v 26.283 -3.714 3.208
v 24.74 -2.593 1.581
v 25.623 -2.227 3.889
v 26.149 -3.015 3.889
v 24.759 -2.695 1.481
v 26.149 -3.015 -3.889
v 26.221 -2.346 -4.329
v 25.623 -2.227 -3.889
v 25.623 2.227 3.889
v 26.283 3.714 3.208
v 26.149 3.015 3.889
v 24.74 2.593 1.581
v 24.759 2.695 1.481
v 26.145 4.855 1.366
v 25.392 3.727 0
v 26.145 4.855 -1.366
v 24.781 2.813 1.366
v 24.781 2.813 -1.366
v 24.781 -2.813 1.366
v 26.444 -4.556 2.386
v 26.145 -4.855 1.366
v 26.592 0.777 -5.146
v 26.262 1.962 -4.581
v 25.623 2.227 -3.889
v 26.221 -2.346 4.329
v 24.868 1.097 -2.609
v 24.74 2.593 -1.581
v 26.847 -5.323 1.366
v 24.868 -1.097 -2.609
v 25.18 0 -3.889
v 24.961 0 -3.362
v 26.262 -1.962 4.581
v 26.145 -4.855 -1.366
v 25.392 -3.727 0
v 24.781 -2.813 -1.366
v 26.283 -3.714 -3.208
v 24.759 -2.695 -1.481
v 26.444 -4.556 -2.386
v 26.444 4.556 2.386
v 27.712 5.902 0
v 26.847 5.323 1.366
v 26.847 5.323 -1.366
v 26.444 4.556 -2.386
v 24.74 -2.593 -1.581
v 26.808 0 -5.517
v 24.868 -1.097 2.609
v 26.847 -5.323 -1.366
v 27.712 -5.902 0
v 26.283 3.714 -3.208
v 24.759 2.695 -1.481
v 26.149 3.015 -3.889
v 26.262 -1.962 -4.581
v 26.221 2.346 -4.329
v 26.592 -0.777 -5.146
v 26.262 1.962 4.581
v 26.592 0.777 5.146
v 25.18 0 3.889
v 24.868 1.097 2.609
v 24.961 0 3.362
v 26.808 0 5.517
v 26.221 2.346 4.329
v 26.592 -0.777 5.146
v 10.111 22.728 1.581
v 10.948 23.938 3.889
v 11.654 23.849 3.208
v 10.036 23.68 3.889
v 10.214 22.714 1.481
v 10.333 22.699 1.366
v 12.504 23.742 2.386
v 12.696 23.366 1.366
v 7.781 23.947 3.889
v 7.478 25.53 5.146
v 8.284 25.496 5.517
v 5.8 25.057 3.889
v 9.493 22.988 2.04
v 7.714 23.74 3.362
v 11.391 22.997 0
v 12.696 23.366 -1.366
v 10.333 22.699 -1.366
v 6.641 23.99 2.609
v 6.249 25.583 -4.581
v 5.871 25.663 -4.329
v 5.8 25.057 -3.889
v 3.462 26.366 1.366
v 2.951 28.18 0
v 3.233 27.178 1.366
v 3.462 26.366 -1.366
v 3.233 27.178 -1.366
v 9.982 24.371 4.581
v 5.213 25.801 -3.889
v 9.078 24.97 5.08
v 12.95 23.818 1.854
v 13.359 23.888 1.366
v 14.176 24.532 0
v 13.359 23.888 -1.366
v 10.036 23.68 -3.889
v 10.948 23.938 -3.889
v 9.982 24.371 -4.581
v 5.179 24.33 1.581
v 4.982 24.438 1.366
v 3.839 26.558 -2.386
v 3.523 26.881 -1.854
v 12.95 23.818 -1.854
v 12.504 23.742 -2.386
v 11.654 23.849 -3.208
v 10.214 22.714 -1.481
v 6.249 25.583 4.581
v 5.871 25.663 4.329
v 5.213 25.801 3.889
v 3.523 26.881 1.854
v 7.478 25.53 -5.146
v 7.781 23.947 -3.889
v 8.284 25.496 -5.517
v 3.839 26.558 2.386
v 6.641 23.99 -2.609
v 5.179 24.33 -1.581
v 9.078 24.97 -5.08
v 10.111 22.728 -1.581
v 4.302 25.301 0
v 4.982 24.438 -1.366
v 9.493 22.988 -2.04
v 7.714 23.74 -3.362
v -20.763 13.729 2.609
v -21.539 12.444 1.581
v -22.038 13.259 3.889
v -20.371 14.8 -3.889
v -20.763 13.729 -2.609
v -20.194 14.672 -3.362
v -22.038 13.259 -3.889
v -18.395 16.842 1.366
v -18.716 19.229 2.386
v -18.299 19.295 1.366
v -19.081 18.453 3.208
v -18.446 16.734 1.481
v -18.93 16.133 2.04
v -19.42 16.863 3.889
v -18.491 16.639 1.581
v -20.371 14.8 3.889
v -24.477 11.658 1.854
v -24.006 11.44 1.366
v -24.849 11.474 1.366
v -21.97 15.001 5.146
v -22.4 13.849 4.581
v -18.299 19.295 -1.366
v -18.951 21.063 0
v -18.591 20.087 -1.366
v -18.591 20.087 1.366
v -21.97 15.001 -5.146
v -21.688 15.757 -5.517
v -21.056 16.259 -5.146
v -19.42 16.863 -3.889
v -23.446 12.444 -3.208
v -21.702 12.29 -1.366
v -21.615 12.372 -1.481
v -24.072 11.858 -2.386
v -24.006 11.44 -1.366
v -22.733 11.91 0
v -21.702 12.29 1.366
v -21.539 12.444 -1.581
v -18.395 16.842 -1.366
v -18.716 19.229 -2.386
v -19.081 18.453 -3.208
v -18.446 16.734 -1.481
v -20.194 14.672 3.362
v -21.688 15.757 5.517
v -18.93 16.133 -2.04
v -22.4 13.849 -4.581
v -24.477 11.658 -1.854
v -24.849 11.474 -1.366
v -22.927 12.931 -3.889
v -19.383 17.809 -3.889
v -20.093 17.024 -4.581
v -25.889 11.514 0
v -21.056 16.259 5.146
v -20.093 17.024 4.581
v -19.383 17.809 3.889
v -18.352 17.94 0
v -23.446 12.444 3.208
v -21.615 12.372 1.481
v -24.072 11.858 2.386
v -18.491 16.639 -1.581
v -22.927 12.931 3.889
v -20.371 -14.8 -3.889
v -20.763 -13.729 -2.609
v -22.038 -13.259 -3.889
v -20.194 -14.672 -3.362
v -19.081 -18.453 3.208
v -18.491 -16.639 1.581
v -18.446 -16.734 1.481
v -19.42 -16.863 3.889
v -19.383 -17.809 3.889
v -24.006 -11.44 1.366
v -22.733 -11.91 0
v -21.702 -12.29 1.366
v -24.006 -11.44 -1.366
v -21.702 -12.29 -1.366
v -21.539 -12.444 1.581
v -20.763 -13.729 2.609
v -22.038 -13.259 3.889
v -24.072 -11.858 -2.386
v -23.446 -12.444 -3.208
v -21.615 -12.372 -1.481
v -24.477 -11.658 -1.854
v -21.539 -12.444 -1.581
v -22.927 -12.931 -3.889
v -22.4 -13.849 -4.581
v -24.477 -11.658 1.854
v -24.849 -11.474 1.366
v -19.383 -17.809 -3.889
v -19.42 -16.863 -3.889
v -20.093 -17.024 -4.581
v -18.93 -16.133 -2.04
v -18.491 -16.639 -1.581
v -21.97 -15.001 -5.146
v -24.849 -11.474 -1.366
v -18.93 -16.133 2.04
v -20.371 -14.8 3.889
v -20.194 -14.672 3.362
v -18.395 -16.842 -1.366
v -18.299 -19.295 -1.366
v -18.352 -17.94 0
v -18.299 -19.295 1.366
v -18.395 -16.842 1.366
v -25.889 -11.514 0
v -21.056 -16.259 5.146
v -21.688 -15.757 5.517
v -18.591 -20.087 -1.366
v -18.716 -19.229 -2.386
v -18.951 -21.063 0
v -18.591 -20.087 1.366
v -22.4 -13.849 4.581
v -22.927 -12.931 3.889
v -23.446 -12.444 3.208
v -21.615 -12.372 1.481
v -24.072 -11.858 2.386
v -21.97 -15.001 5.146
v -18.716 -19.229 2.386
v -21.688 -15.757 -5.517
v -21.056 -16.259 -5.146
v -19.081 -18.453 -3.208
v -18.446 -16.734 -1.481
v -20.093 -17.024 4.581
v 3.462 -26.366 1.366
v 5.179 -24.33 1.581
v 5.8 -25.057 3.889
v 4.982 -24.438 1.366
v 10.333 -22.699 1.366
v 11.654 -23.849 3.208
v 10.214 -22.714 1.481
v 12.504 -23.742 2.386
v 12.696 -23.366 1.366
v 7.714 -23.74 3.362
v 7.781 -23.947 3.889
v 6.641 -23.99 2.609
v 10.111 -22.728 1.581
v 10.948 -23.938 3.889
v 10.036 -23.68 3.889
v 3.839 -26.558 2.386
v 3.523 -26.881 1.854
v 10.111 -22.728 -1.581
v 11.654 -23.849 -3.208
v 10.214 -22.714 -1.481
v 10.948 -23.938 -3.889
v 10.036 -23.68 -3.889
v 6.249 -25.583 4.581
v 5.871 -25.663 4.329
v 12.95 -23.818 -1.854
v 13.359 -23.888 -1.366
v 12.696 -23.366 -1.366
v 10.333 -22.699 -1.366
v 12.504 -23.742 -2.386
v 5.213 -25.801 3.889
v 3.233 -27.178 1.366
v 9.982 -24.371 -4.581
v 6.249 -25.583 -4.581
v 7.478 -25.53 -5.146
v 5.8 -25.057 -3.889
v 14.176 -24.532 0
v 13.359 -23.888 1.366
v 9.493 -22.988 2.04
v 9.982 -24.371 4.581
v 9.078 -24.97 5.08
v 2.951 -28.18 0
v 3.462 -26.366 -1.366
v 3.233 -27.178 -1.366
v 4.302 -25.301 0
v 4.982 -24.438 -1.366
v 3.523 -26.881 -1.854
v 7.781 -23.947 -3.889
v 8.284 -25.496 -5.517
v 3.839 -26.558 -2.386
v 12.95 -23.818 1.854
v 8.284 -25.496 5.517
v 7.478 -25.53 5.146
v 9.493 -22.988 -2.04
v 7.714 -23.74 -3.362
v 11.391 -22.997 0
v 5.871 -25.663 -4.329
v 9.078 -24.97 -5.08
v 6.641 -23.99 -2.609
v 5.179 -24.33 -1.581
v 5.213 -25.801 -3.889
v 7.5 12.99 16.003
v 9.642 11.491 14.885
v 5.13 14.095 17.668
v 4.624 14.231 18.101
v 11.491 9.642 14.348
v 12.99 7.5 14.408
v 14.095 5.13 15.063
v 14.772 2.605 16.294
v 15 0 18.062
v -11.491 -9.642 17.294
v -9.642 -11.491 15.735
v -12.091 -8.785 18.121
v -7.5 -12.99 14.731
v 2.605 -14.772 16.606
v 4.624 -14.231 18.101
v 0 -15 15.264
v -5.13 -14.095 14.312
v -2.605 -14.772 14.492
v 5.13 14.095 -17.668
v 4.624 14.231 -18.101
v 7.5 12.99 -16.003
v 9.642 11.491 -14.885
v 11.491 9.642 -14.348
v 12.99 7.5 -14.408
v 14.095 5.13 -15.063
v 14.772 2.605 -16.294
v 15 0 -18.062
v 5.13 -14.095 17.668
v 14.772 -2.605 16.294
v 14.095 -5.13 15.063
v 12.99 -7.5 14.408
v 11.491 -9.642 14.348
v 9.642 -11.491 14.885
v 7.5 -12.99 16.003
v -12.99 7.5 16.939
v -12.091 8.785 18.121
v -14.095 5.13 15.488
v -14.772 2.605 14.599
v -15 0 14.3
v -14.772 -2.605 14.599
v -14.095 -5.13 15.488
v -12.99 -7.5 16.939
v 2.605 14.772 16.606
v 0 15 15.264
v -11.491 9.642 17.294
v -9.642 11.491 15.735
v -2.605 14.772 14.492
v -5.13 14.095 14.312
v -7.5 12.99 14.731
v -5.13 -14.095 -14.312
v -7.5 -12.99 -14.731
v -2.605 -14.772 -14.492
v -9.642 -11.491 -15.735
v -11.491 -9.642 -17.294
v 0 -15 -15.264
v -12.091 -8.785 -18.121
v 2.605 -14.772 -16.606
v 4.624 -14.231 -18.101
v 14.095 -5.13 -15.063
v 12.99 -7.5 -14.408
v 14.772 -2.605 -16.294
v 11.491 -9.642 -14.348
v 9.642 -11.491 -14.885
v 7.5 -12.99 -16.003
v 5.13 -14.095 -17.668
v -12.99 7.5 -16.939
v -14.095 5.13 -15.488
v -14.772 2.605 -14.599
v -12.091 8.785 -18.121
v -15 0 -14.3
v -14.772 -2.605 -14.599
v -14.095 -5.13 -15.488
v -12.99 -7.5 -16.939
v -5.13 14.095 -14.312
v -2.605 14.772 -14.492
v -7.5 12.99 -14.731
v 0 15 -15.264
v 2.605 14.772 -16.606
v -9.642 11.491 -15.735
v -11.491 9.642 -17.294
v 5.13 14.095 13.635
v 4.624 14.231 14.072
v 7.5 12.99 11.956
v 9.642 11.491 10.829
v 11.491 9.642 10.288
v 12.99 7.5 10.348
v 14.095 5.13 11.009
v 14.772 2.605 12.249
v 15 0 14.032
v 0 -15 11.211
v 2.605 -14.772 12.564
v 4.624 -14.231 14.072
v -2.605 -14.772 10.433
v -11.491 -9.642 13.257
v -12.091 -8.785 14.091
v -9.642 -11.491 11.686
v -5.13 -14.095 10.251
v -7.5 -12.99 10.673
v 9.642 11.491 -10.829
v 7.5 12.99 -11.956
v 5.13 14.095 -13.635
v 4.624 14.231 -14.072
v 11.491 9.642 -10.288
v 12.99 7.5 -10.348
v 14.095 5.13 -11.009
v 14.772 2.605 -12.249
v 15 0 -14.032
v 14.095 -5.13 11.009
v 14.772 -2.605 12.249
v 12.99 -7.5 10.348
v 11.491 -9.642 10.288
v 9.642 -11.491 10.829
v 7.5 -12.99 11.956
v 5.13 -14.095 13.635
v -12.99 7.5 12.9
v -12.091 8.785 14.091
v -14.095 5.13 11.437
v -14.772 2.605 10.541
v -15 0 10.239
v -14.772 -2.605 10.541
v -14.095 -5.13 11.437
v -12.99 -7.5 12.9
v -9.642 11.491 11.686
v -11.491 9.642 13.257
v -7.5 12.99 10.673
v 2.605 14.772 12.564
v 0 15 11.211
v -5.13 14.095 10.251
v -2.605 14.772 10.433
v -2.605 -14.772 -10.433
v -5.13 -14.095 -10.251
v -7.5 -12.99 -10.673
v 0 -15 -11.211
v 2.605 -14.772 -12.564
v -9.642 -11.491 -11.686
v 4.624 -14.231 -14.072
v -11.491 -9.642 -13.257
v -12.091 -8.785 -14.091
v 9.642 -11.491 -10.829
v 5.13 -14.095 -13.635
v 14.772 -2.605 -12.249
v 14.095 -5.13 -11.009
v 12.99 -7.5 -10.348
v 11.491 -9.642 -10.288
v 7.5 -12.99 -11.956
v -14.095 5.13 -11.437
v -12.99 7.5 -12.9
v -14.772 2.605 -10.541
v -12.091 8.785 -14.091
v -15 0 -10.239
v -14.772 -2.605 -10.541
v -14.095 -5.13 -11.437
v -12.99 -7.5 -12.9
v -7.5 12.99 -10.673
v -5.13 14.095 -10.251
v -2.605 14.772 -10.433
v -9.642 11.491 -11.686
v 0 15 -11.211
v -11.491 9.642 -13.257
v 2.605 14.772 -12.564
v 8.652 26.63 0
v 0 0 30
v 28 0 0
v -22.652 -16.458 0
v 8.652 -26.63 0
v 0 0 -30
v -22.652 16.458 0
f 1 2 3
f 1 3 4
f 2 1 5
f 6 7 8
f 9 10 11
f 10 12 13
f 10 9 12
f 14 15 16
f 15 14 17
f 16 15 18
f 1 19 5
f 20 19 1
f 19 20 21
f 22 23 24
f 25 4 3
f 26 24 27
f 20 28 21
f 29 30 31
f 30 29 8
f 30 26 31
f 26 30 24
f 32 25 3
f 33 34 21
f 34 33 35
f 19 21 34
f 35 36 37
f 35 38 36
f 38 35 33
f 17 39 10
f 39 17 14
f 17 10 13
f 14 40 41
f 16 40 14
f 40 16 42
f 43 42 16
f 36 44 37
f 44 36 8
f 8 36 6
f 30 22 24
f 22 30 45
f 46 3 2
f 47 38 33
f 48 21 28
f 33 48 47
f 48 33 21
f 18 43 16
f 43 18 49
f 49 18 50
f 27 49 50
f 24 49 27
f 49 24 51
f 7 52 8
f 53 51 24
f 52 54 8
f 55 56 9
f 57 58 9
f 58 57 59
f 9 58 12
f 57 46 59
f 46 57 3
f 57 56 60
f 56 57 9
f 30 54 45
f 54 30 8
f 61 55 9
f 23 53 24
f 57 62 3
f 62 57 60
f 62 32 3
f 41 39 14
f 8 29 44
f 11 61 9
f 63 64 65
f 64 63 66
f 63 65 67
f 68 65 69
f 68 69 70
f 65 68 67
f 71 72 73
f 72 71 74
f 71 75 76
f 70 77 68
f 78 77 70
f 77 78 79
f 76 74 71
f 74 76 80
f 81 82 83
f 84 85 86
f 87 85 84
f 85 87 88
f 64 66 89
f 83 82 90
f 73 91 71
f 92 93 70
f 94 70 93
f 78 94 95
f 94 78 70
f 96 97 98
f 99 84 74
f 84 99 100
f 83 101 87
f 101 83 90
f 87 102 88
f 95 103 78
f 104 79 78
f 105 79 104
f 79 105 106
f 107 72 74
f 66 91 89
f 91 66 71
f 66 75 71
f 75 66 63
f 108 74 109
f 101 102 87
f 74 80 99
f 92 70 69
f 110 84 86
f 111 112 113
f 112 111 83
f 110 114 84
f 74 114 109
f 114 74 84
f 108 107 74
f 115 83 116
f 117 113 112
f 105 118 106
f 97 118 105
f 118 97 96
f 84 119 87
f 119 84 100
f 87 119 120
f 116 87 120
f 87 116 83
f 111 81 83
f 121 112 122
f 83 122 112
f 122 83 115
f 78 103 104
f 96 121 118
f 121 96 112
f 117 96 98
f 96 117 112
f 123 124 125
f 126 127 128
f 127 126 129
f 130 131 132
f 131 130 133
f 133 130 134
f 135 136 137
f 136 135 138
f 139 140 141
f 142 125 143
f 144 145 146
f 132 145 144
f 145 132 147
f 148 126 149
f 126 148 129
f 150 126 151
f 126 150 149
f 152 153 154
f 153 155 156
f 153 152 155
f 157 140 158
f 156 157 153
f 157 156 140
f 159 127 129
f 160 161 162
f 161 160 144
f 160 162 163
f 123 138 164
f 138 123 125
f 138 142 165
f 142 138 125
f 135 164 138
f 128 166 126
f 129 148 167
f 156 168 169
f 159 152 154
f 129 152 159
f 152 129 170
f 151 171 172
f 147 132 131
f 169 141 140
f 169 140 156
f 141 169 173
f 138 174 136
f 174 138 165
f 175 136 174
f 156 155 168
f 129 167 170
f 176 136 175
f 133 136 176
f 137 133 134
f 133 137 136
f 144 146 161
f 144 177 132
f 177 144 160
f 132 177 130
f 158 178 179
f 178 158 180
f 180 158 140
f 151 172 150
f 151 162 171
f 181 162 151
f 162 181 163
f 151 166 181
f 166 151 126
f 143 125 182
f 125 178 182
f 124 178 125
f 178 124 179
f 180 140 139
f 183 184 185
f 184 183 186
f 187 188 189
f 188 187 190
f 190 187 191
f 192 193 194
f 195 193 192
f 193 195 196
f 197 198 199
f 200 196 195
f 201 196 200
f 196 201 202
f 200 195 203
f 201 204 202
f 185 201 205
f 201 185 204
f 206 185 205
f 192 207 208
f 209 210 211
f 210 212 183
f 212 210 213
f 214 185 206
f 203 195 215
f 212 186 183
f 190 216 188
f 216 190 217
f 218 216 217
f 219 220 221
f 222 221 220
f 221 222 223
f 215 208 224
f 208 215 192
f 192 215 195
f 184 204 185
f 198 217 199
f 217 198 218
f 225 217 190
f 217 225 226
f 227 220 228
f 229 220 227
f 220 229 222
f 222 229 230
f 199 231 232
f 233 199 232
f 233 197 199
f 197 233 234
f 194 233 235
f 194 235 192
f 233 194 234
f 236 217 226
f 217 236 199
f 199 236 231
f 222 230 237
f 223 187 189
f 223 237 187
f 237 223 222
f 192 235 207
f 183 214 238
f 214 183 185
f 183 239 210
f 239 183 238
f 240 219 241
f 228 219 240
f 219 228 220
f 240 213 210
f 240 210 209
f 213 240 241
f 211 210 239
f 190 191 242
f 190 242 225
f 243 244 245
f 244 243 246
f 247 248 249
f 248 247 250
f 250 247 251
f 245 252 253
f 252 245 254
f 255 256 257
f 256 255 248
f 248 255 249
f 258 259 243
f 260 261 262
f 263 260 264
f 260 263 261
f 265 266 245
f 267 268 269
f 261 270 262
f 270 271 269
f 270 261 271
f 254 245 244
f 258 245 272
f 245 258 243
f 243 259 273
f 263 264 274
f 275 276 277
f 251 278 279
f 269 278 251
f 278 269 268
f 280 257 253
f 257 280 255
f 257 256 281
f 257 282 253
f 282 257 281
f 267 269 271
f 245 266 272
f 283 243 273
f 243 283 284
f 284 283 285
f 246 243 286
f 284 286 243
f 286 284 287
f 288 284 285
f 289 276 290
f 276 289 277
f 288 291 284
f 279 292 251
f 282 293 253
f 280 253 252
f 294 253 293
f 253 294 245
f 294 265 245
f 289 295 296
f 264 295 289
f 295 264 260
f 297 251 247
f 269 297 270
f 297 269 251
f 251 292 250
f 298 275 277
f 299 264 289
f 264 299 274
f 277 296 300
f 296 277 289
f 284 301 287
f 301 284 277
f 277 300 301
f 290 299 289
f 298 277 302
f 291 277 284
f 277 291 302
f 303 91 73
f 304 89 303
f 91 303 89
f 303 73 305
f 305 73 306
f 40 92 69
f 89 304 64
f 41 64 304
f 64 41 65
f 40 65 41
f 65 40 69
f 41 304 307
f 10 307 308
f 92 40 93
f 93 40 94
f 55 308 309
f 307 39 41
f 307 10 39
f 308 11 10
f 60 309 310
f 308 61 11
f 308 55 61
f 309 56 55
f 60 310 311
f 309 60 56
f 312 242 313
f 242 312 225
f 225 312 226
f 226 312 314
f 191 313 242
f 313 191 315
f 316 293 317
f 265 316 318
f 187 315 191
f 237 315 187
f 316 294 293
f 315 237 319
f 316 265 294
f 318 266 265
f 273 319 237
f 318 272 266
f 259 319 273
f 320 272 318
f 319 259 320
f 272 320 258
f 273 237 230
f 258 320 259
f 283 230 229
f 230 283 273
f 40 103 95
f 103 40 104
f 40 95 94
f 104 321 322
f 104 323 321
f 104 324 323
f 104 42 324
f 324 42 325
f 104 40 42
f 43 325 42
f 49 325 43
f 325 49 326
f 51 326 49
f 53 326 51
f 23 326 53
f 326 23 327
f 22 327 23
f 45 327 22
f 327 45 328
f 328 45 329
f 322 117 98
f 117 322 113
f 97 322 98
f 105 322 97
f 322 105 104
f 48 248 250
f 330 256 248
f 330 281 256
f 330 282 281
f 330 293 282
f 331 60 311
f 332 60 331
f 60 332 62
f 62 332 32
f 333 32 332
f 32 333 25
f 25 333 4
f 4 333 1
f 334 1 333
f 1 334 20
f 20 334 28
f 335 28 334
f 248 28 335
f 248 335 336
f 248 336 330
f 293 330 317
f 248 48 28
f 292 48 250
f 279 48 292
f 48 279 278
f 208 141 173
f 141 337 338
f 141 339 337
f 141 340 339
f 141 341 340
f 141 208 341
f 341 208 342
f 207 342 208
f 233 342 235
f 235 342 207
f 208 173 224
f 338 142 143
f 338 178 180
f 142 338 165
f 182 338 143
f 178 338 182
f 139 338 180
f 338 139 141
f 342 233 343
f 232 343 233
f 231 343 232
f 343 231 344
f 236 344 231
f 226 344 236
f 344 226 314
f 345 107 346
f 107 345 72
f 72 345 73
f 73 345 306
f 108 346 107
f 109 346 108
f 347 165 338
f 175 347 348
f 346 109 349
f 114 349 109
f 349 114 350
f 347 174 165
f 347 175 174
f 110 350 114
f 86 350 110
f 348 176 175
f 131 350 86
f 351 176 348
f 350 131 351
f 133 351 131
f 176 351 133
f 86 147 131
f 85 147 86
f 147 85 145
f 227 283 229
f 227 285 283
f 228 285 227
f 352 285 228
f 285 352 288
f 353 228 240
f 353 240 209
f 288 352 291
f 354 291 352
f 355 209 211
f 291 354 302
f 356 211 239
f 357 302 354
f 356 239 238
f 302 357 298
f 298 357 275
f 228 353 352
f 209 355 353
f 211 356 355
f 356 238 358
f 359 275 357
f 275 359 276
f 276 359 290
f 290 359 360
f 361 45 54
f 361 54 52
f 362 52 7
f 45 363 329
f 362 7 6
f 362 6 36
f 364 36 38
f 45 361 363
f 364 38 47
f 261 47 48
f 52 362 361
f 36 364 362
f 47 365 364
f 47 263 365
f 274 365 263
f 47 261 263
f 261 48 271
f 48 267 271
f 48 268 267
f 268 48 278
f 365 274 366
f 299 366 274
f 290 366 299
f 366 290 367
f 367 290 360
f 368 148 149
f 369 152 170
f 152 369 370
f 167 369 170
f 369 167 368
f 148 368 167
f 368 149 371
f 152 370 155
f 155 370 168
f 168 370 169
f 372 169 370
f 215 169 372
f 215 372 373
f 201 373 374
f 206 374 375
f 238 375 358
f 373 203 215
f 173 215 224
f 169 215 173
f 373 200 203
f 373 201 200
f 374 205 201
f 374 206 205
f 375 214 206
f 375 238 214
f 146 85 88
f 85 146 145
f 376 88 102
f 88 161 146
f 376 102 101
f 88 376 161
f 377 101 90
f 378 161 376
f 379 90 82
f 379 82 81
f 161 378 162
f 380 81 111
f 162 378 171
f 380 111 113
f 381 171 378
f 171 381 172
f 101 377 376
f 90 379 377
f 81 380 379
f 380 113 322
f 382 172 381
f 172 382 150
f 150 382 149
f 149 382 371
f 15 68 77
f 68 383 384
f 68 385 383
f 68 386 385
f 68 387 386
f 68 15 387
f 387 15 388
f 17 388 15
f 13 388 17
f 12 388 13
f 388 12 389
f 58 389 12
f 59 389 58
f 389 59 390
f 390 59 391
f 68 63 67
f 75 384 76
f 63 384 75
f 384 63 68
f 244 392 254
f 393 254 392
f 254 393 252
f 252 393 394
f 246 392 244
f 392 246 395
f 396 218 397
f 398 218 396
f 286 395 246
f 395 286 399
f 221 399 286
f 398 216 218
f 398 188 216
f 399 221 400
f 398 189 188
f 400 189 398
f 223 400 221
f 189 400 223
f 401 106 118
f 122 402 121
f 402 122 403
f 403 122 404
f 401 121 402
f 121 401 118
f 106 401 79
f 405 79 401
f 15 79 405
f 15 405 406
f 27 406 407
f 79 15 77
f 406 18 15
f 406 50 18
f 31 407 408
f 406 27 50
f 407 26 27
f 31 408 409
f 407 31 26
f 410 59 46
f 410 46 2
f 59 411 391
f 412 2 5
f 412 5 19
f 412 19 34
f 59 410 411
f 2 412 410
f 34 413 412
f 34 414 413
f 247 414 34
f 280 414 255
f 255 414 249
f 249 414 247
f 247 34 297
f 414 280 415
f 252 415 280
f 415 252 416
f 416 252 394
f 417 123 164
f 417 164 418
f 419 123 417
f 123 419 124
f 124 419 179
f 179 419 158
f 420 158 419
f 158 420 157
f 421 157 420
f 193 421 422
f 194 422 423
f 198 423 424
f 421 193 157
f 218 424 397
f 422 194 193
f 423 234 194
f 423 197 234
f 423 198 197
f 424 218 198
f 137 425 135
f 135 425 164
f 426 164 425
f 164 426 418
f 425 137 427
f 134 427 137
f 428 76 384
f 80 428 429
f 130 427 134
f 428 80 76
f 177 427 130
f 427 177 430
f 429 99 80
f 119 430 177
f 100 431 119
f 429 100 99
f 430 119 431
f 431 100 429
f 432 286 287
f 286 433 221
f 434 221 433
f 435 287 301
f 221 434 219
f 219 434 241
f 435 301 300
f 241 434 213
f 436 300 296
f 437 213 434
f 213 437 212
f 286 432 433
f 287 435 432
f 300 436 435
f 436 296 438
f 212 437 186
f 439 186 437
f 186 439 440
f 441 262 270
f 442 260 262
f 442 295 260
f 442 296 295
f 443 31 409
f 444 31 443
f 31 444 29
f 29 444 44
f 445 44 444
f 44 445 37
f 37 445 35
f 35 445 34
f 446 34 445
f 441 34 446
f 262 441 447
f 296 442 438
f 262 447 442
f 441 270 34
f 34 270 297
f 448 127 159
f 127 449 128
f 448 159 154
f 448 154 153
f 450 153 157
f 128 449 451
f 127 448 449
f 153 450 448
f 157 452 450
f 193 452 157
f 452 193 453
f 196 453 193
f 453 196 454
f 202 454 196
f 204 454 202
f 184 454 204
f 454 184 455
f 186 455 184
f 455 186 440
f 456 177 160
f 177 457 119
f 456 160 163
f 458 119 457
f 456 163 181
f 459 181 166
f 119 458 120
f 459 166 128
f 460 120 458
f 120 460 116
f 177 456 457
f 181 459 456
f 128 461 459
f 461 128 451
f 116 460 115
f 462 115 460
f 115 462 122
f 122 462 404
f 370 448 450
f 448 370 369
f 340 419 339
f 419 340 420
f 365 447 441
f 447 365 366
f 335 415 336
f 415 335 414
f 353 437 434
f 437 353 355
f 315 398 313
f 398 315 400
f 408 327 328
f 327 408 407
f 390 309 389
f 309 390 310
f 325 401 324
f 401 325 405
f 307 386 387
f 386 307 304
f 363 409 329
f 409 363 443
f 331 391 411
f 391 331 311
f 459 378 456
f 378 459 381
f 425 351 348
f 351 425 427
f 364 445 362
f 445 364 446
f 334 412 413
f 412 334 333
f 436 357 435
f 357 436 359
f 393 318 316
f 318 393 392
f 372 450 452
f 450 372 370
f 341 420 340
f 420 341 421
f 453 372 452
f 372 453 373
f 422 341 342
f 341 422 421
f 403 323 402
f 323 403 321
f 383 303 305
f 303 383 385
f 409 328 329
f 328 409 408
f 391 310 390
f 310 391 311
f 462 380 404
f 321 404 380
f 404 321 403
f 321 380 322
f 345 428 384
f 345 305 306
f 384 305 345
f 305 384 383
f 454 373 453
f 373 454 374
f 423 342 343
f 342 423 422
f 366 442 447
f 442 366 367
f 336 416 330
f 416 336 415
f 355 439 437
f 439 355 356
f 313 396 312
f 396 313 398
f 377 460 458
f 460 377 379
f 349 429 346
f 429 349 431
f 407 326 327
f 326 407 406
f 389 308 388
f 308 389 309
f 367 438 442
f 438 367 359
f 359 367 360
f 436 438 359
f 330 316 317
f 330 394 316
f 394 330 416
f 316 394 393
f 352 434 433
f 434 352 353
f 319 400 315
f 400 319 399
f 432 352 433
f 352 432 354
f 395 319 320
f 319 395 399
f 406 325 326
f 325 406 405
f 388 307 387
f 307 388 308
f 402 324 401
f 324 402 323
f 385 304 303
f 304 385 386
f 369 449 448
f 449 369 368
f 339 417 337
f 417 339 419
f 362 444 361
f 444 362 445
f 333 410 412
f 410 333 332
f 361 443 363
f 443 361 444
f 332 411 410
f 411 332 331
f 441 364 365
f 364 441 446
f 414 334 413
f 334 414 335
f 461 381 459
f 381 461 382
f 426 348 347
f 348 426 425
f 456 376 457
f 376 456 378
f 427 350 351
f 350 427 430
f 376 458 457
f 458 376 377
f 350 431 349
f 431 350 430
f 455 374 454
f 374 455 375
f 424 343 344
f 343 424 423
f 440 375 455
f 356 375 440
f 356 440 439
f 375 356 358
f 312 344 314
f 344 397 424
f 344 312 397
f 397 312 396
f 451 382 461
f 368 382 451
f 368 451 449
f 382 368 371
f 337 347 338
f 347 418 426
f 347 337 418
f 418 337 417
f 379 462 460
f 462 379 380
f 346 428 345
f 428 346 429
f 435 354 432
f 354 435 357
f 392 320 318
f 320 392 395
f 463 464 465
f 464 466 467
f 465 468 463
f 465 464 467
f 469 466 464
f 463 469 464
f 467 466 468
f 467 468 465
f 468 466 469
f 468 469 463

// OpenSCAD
// file: cubix_params.scad
// =====================================================
// cubix_params.scad — CUBIX-ICODED Shared Parameters
// Author: Bojan Sebastian Andrei (Cluj-Napoca, Romania)
// Status: Phase 0 — Digital Geometry Validation
// Rev: v0.3-pre-prototype
// =====================================================

// ─── MATHEMATICAL CONSTANTS ──────────────────────────
PHI = (1 + sqrt(5)) / 2;           // Golden ratio ≈ 1.618033...

// ─── ROTOR — ICOSAHEDRAL MATRIX ──────────────────────
ROTOR_EDGE       = 115.34;         // Panel edge length (mm)
ROTOR_WALL       = 5.0;            // Panel wall thickness — PEEK-CF (mm)
ROTOR_BEVEL      = 20.905;         // Edge chamfer angle (degrees)

// ─── MAGNETIC SYSTEM ─────────────────────────────────
MAG_L            = 25.0;           // Magnet length (mm)
MAG_W            = 10.0;           // Magnet width (mm)
MAG_D            = 5.0;            // Magnet depth into panel (mm)
MAG_CLEAR        = 0.15;           // Pocket assembly clearance (mm)
MAG_PER_CLUSTER  = 5;              // SmCo magnets per vertex cluster
NUM_CLUSTERS     = 12;             // = number of icosahedron vertices

// ─── SHAFT & BEARINGS ────────────────────────────────
SHAFT_D          = 30.0;           // Shaft diameter (mm)
SHAFT_TOL        = 0.02;           // Bore H7 tolerance (mm)
BEARING_OD       = 62.0;           // 6006 series bearing OD (mm)
BEARING_W        = 16.0;           // Bearing width (mm)
KEYWAY_W         = 8.0;            // Keyway width (mm)
KEYWAY_H         = 4.0;            // Keyway depth (mm)

// ─── AIR GAP ─────────────────────────────────────────
AIR_GAP          = 0.30;           // Radial rotor-stator clearance (mm)
PRECESSION_TOL   = 0.02;           // Max allowed precession (mm)

// ─── STATOR — DODECAHEDRAL SYSTEM ────────────────────
// Inradius of stator = rotor circumradius + air gap
// Rotor circumradius = ROTOR_EDGE × 0.9511 (icosahedron geometry)
// Dodecahedron: inradius = edge × 1.1135
ROTOR_CIRCUM     = ROTOR_EDGE * 0.9511;            // ≈ 109.7 mm
STATOR_INRAD     = ROTOR_CIRCUM + AIR_GAP;         // ≈ 110.0 mm
STATOR_EDGE      = STATOR_INRAD / 1.1135;          // ≈  98.8 mm
STATOR_WALL      = 6.0;            // Shell thickness — PEEK (mm)
COIL_BORE_D      = 35.0;           // Coil gate bore diameter (mm)
COIL_BORE_DEPTH  = 18.0;           // Coil gate bore depth (mm)
STATOR_OFFSET    = 31.71;          // Phase offset angle (degrees)
STATOR_RING_D    = 280.0;          // Support ring outer diameter (mm)
STATOR_RING_T    = 10.0;           // Support ring thickness (mm)

// ─── GATE ASSIGNMENT ─────────────────────────────────
// Face indices 0-2  → Impulse gates  I1, I2, I3
// Face indices 3-11 → Harvesting gates H1-H9
NUM_IMPULSE      = 3;
NUM_HARVEST      = 9;

// ─── EMF SHIELDING — RHOMBIC TRIACONTAHEDRON ─────────
SHIELD_PANEL_A   = 52.0;           // Panel long edge ≈ 50 mm (approx)

// ─── EXTERNAL FRAME — CUBIC Ti STRUCTURE ─────────────
FRAME_OUTER      = 330.0;          // Outer cube dimension (mm)
FRAME_WALL       = 8.0;            // Wall thickness — Ti Grade 5 (mm)
FRAME_INNER      = FRAME_OUTER - 2*FRAME_WALL;     // 314.0 mm
PORT_D           = 45.0;           // Frame port bore diameter (mm)
HATCH_SIZE       = 80.0;           // Access hatch side (mm)
M6_BORE          = 6.5;            // M6 clearance bore (mm)

// ─── CENTRAL CORE — PENTAGONAL BIPYRAMIDAL ───────────
CORE_R           = 28.0;           // Equatorial radius — Bismuth (mm)
CORE_H           = 30.0;           // Half-height of bipyramid (mm)
CORE_WALL        = 4.0;            // PEEK cage wall thickness (mm)

// ─── RENDER QUALITY ──────────────────────────────────
$fn  = 72;                         // Default circle resolution
$eps = 0.01;                       // Boolean overlap epsilon
// main file
// =====================================================
// cubix_core.scad — Pentagonal Bipyramidal Core
// CUBIX-ICODED | Phase 0 Geometry
// =====================================================
// Bismuth core: 99.99% purity, μr ≈ 0.99983 (diamagnetic)
//   → repels magnetic fields passively, no supercooling needed
//   → low melting point (271°C): use sharp carbide, no coolant flood
// PEEK cage: non-conductive, non-magnetic support skeleton
//   → 5 equatorial windows for flux interaction
//   → M3 nylon mount screws at 5 positions
//
// Phase 1 option: replace Bismuth with PTFE dummy core
//   (same geometry, zero fracture risk during spin-up tests)
// =====================================================

include <cubix_params.scad>

// ─── BIPYRAMID VERTICES ───────────────────────────────
// r = equatorial radius, h = half-height (apex distance)
function bpy_verts(r=CORE_R, h=CORE_H) = concat(
    [ for (i=[0:4]) [r*cos(72*i), r*sin(72*i), 0] ],  // v0–v4 equatorial
    [[0, 0,  h]],                                       // v5 top apex
    [[0, 0, -h]]                                        // v6 bottom apex
);

// ─── 10 TRIANGULAR FACES (CCW from outside) ───────────
function bpy_faces() = [
    // Top pyramid (apex = v5)
    [0,5,1], [1,5,2], [2,5,3], [3,5,4], [4,5,0],
    // Bottom pyramid (apex = v6) — reversed winding
    [1,6,0], [2,6,1], [3,6,2], [4,6,3], [0,6,4]
];

// ─── SOLID BISMUTH CORE ───────────────────────────────
module bismuth_core() {
    color("#b87333", 0.95)   // Bismuth iridescent approximation
    polyhedron(
        points = bpy_verts(r=CORE_R, h=CORE_H),
        faces  = bpy_faces(),
        convexity = 3
    );
}

// ─── PEEK SUPPORT CAGE ────────────────────────────────
module peek_cage() {
    r_o = CORE_R + CORE_WALL;
    h_o = CORE_H + CORE_WALL;
    r_i = CORE_R + 0.1;    // 0.1 mm bismuth clearance
    h_i = CORE_H + 0.1;

    color("ivory", 0.8)
    difference() {
        // Outer cage bipyramid
        polyhedron(points=bpy_verts(r=r_o, h=h_o),
                   faces=bpy_faces(), convexity=3);
        // Inner void (bismuth space)
        polyhedron(points=bpy_verts(r=r_i, h=h_i),
                   faces=bpy_faces(), convexity=3);
        // Shaft bore
        cylinder(h=(h_o+1)*2, d=SHAFT_D, center=true, $fn=36);
        // 5 equatorial flux windows (spherical cutouts)
        for (i=[0:4])
            rotate([0,0,72*i])
            translate([r_o-1, 0, 0])
                sphere(r=7, $fn=16);
        // 5 M3 nylon mount holes (offset 36° from windows)
        for (i=[0:4])
            rotate([0,0,72*i+36])
            translate([(r_o+r_i)/2, 0, 0])
                cylinder(h=(h_o+2)*2, d=3.3, center=true, $fn=12);
    }
}

// ─── COMPLETE CORE ASSEMBLY ───────────────────────────
module cubix_core() {
    bismuth_core();
    peek_cage();
}

// ─── PHASE 1 DUMMY (PTFE substitute) ──────────────────
module cubix_core_ptfe_dummy() {
    color("white", 0.9)
    polyhedron(
        points = bpy_verts(r=CORE_R, h=CORE_H),
        faces  = bpy_faces(),
        convexity = 3
    );
    peek_cage();
}

// ─── RENDER (change to cubix_core_ptfe_dummy() for Phase 1) ──
cubix_core();
// cubix_core_ptfe_dummy();  // ← uncomment for Phase 1 safe testing

// Axis reference
%color("crimson")
    cylinder(h=CORE_H*4, d=1, center=true);

// ─── ECHO GEOMETRY ────────────────────────────────────
echo(str("Core equatorial R: ", CORE_R, " mm"));
echo(str("Core half-height:  ", CORE_H, " mm"));
echo(str("PEEK cage wall:    ", CORE_WALL, " mm"));
echo(str("Shaft bore Ø:      ", SHAFT_D, " mm"));
echo(str("Phase 1 note: Swap bismuth_core() → cubix_core_ptfe_dummy()"));
